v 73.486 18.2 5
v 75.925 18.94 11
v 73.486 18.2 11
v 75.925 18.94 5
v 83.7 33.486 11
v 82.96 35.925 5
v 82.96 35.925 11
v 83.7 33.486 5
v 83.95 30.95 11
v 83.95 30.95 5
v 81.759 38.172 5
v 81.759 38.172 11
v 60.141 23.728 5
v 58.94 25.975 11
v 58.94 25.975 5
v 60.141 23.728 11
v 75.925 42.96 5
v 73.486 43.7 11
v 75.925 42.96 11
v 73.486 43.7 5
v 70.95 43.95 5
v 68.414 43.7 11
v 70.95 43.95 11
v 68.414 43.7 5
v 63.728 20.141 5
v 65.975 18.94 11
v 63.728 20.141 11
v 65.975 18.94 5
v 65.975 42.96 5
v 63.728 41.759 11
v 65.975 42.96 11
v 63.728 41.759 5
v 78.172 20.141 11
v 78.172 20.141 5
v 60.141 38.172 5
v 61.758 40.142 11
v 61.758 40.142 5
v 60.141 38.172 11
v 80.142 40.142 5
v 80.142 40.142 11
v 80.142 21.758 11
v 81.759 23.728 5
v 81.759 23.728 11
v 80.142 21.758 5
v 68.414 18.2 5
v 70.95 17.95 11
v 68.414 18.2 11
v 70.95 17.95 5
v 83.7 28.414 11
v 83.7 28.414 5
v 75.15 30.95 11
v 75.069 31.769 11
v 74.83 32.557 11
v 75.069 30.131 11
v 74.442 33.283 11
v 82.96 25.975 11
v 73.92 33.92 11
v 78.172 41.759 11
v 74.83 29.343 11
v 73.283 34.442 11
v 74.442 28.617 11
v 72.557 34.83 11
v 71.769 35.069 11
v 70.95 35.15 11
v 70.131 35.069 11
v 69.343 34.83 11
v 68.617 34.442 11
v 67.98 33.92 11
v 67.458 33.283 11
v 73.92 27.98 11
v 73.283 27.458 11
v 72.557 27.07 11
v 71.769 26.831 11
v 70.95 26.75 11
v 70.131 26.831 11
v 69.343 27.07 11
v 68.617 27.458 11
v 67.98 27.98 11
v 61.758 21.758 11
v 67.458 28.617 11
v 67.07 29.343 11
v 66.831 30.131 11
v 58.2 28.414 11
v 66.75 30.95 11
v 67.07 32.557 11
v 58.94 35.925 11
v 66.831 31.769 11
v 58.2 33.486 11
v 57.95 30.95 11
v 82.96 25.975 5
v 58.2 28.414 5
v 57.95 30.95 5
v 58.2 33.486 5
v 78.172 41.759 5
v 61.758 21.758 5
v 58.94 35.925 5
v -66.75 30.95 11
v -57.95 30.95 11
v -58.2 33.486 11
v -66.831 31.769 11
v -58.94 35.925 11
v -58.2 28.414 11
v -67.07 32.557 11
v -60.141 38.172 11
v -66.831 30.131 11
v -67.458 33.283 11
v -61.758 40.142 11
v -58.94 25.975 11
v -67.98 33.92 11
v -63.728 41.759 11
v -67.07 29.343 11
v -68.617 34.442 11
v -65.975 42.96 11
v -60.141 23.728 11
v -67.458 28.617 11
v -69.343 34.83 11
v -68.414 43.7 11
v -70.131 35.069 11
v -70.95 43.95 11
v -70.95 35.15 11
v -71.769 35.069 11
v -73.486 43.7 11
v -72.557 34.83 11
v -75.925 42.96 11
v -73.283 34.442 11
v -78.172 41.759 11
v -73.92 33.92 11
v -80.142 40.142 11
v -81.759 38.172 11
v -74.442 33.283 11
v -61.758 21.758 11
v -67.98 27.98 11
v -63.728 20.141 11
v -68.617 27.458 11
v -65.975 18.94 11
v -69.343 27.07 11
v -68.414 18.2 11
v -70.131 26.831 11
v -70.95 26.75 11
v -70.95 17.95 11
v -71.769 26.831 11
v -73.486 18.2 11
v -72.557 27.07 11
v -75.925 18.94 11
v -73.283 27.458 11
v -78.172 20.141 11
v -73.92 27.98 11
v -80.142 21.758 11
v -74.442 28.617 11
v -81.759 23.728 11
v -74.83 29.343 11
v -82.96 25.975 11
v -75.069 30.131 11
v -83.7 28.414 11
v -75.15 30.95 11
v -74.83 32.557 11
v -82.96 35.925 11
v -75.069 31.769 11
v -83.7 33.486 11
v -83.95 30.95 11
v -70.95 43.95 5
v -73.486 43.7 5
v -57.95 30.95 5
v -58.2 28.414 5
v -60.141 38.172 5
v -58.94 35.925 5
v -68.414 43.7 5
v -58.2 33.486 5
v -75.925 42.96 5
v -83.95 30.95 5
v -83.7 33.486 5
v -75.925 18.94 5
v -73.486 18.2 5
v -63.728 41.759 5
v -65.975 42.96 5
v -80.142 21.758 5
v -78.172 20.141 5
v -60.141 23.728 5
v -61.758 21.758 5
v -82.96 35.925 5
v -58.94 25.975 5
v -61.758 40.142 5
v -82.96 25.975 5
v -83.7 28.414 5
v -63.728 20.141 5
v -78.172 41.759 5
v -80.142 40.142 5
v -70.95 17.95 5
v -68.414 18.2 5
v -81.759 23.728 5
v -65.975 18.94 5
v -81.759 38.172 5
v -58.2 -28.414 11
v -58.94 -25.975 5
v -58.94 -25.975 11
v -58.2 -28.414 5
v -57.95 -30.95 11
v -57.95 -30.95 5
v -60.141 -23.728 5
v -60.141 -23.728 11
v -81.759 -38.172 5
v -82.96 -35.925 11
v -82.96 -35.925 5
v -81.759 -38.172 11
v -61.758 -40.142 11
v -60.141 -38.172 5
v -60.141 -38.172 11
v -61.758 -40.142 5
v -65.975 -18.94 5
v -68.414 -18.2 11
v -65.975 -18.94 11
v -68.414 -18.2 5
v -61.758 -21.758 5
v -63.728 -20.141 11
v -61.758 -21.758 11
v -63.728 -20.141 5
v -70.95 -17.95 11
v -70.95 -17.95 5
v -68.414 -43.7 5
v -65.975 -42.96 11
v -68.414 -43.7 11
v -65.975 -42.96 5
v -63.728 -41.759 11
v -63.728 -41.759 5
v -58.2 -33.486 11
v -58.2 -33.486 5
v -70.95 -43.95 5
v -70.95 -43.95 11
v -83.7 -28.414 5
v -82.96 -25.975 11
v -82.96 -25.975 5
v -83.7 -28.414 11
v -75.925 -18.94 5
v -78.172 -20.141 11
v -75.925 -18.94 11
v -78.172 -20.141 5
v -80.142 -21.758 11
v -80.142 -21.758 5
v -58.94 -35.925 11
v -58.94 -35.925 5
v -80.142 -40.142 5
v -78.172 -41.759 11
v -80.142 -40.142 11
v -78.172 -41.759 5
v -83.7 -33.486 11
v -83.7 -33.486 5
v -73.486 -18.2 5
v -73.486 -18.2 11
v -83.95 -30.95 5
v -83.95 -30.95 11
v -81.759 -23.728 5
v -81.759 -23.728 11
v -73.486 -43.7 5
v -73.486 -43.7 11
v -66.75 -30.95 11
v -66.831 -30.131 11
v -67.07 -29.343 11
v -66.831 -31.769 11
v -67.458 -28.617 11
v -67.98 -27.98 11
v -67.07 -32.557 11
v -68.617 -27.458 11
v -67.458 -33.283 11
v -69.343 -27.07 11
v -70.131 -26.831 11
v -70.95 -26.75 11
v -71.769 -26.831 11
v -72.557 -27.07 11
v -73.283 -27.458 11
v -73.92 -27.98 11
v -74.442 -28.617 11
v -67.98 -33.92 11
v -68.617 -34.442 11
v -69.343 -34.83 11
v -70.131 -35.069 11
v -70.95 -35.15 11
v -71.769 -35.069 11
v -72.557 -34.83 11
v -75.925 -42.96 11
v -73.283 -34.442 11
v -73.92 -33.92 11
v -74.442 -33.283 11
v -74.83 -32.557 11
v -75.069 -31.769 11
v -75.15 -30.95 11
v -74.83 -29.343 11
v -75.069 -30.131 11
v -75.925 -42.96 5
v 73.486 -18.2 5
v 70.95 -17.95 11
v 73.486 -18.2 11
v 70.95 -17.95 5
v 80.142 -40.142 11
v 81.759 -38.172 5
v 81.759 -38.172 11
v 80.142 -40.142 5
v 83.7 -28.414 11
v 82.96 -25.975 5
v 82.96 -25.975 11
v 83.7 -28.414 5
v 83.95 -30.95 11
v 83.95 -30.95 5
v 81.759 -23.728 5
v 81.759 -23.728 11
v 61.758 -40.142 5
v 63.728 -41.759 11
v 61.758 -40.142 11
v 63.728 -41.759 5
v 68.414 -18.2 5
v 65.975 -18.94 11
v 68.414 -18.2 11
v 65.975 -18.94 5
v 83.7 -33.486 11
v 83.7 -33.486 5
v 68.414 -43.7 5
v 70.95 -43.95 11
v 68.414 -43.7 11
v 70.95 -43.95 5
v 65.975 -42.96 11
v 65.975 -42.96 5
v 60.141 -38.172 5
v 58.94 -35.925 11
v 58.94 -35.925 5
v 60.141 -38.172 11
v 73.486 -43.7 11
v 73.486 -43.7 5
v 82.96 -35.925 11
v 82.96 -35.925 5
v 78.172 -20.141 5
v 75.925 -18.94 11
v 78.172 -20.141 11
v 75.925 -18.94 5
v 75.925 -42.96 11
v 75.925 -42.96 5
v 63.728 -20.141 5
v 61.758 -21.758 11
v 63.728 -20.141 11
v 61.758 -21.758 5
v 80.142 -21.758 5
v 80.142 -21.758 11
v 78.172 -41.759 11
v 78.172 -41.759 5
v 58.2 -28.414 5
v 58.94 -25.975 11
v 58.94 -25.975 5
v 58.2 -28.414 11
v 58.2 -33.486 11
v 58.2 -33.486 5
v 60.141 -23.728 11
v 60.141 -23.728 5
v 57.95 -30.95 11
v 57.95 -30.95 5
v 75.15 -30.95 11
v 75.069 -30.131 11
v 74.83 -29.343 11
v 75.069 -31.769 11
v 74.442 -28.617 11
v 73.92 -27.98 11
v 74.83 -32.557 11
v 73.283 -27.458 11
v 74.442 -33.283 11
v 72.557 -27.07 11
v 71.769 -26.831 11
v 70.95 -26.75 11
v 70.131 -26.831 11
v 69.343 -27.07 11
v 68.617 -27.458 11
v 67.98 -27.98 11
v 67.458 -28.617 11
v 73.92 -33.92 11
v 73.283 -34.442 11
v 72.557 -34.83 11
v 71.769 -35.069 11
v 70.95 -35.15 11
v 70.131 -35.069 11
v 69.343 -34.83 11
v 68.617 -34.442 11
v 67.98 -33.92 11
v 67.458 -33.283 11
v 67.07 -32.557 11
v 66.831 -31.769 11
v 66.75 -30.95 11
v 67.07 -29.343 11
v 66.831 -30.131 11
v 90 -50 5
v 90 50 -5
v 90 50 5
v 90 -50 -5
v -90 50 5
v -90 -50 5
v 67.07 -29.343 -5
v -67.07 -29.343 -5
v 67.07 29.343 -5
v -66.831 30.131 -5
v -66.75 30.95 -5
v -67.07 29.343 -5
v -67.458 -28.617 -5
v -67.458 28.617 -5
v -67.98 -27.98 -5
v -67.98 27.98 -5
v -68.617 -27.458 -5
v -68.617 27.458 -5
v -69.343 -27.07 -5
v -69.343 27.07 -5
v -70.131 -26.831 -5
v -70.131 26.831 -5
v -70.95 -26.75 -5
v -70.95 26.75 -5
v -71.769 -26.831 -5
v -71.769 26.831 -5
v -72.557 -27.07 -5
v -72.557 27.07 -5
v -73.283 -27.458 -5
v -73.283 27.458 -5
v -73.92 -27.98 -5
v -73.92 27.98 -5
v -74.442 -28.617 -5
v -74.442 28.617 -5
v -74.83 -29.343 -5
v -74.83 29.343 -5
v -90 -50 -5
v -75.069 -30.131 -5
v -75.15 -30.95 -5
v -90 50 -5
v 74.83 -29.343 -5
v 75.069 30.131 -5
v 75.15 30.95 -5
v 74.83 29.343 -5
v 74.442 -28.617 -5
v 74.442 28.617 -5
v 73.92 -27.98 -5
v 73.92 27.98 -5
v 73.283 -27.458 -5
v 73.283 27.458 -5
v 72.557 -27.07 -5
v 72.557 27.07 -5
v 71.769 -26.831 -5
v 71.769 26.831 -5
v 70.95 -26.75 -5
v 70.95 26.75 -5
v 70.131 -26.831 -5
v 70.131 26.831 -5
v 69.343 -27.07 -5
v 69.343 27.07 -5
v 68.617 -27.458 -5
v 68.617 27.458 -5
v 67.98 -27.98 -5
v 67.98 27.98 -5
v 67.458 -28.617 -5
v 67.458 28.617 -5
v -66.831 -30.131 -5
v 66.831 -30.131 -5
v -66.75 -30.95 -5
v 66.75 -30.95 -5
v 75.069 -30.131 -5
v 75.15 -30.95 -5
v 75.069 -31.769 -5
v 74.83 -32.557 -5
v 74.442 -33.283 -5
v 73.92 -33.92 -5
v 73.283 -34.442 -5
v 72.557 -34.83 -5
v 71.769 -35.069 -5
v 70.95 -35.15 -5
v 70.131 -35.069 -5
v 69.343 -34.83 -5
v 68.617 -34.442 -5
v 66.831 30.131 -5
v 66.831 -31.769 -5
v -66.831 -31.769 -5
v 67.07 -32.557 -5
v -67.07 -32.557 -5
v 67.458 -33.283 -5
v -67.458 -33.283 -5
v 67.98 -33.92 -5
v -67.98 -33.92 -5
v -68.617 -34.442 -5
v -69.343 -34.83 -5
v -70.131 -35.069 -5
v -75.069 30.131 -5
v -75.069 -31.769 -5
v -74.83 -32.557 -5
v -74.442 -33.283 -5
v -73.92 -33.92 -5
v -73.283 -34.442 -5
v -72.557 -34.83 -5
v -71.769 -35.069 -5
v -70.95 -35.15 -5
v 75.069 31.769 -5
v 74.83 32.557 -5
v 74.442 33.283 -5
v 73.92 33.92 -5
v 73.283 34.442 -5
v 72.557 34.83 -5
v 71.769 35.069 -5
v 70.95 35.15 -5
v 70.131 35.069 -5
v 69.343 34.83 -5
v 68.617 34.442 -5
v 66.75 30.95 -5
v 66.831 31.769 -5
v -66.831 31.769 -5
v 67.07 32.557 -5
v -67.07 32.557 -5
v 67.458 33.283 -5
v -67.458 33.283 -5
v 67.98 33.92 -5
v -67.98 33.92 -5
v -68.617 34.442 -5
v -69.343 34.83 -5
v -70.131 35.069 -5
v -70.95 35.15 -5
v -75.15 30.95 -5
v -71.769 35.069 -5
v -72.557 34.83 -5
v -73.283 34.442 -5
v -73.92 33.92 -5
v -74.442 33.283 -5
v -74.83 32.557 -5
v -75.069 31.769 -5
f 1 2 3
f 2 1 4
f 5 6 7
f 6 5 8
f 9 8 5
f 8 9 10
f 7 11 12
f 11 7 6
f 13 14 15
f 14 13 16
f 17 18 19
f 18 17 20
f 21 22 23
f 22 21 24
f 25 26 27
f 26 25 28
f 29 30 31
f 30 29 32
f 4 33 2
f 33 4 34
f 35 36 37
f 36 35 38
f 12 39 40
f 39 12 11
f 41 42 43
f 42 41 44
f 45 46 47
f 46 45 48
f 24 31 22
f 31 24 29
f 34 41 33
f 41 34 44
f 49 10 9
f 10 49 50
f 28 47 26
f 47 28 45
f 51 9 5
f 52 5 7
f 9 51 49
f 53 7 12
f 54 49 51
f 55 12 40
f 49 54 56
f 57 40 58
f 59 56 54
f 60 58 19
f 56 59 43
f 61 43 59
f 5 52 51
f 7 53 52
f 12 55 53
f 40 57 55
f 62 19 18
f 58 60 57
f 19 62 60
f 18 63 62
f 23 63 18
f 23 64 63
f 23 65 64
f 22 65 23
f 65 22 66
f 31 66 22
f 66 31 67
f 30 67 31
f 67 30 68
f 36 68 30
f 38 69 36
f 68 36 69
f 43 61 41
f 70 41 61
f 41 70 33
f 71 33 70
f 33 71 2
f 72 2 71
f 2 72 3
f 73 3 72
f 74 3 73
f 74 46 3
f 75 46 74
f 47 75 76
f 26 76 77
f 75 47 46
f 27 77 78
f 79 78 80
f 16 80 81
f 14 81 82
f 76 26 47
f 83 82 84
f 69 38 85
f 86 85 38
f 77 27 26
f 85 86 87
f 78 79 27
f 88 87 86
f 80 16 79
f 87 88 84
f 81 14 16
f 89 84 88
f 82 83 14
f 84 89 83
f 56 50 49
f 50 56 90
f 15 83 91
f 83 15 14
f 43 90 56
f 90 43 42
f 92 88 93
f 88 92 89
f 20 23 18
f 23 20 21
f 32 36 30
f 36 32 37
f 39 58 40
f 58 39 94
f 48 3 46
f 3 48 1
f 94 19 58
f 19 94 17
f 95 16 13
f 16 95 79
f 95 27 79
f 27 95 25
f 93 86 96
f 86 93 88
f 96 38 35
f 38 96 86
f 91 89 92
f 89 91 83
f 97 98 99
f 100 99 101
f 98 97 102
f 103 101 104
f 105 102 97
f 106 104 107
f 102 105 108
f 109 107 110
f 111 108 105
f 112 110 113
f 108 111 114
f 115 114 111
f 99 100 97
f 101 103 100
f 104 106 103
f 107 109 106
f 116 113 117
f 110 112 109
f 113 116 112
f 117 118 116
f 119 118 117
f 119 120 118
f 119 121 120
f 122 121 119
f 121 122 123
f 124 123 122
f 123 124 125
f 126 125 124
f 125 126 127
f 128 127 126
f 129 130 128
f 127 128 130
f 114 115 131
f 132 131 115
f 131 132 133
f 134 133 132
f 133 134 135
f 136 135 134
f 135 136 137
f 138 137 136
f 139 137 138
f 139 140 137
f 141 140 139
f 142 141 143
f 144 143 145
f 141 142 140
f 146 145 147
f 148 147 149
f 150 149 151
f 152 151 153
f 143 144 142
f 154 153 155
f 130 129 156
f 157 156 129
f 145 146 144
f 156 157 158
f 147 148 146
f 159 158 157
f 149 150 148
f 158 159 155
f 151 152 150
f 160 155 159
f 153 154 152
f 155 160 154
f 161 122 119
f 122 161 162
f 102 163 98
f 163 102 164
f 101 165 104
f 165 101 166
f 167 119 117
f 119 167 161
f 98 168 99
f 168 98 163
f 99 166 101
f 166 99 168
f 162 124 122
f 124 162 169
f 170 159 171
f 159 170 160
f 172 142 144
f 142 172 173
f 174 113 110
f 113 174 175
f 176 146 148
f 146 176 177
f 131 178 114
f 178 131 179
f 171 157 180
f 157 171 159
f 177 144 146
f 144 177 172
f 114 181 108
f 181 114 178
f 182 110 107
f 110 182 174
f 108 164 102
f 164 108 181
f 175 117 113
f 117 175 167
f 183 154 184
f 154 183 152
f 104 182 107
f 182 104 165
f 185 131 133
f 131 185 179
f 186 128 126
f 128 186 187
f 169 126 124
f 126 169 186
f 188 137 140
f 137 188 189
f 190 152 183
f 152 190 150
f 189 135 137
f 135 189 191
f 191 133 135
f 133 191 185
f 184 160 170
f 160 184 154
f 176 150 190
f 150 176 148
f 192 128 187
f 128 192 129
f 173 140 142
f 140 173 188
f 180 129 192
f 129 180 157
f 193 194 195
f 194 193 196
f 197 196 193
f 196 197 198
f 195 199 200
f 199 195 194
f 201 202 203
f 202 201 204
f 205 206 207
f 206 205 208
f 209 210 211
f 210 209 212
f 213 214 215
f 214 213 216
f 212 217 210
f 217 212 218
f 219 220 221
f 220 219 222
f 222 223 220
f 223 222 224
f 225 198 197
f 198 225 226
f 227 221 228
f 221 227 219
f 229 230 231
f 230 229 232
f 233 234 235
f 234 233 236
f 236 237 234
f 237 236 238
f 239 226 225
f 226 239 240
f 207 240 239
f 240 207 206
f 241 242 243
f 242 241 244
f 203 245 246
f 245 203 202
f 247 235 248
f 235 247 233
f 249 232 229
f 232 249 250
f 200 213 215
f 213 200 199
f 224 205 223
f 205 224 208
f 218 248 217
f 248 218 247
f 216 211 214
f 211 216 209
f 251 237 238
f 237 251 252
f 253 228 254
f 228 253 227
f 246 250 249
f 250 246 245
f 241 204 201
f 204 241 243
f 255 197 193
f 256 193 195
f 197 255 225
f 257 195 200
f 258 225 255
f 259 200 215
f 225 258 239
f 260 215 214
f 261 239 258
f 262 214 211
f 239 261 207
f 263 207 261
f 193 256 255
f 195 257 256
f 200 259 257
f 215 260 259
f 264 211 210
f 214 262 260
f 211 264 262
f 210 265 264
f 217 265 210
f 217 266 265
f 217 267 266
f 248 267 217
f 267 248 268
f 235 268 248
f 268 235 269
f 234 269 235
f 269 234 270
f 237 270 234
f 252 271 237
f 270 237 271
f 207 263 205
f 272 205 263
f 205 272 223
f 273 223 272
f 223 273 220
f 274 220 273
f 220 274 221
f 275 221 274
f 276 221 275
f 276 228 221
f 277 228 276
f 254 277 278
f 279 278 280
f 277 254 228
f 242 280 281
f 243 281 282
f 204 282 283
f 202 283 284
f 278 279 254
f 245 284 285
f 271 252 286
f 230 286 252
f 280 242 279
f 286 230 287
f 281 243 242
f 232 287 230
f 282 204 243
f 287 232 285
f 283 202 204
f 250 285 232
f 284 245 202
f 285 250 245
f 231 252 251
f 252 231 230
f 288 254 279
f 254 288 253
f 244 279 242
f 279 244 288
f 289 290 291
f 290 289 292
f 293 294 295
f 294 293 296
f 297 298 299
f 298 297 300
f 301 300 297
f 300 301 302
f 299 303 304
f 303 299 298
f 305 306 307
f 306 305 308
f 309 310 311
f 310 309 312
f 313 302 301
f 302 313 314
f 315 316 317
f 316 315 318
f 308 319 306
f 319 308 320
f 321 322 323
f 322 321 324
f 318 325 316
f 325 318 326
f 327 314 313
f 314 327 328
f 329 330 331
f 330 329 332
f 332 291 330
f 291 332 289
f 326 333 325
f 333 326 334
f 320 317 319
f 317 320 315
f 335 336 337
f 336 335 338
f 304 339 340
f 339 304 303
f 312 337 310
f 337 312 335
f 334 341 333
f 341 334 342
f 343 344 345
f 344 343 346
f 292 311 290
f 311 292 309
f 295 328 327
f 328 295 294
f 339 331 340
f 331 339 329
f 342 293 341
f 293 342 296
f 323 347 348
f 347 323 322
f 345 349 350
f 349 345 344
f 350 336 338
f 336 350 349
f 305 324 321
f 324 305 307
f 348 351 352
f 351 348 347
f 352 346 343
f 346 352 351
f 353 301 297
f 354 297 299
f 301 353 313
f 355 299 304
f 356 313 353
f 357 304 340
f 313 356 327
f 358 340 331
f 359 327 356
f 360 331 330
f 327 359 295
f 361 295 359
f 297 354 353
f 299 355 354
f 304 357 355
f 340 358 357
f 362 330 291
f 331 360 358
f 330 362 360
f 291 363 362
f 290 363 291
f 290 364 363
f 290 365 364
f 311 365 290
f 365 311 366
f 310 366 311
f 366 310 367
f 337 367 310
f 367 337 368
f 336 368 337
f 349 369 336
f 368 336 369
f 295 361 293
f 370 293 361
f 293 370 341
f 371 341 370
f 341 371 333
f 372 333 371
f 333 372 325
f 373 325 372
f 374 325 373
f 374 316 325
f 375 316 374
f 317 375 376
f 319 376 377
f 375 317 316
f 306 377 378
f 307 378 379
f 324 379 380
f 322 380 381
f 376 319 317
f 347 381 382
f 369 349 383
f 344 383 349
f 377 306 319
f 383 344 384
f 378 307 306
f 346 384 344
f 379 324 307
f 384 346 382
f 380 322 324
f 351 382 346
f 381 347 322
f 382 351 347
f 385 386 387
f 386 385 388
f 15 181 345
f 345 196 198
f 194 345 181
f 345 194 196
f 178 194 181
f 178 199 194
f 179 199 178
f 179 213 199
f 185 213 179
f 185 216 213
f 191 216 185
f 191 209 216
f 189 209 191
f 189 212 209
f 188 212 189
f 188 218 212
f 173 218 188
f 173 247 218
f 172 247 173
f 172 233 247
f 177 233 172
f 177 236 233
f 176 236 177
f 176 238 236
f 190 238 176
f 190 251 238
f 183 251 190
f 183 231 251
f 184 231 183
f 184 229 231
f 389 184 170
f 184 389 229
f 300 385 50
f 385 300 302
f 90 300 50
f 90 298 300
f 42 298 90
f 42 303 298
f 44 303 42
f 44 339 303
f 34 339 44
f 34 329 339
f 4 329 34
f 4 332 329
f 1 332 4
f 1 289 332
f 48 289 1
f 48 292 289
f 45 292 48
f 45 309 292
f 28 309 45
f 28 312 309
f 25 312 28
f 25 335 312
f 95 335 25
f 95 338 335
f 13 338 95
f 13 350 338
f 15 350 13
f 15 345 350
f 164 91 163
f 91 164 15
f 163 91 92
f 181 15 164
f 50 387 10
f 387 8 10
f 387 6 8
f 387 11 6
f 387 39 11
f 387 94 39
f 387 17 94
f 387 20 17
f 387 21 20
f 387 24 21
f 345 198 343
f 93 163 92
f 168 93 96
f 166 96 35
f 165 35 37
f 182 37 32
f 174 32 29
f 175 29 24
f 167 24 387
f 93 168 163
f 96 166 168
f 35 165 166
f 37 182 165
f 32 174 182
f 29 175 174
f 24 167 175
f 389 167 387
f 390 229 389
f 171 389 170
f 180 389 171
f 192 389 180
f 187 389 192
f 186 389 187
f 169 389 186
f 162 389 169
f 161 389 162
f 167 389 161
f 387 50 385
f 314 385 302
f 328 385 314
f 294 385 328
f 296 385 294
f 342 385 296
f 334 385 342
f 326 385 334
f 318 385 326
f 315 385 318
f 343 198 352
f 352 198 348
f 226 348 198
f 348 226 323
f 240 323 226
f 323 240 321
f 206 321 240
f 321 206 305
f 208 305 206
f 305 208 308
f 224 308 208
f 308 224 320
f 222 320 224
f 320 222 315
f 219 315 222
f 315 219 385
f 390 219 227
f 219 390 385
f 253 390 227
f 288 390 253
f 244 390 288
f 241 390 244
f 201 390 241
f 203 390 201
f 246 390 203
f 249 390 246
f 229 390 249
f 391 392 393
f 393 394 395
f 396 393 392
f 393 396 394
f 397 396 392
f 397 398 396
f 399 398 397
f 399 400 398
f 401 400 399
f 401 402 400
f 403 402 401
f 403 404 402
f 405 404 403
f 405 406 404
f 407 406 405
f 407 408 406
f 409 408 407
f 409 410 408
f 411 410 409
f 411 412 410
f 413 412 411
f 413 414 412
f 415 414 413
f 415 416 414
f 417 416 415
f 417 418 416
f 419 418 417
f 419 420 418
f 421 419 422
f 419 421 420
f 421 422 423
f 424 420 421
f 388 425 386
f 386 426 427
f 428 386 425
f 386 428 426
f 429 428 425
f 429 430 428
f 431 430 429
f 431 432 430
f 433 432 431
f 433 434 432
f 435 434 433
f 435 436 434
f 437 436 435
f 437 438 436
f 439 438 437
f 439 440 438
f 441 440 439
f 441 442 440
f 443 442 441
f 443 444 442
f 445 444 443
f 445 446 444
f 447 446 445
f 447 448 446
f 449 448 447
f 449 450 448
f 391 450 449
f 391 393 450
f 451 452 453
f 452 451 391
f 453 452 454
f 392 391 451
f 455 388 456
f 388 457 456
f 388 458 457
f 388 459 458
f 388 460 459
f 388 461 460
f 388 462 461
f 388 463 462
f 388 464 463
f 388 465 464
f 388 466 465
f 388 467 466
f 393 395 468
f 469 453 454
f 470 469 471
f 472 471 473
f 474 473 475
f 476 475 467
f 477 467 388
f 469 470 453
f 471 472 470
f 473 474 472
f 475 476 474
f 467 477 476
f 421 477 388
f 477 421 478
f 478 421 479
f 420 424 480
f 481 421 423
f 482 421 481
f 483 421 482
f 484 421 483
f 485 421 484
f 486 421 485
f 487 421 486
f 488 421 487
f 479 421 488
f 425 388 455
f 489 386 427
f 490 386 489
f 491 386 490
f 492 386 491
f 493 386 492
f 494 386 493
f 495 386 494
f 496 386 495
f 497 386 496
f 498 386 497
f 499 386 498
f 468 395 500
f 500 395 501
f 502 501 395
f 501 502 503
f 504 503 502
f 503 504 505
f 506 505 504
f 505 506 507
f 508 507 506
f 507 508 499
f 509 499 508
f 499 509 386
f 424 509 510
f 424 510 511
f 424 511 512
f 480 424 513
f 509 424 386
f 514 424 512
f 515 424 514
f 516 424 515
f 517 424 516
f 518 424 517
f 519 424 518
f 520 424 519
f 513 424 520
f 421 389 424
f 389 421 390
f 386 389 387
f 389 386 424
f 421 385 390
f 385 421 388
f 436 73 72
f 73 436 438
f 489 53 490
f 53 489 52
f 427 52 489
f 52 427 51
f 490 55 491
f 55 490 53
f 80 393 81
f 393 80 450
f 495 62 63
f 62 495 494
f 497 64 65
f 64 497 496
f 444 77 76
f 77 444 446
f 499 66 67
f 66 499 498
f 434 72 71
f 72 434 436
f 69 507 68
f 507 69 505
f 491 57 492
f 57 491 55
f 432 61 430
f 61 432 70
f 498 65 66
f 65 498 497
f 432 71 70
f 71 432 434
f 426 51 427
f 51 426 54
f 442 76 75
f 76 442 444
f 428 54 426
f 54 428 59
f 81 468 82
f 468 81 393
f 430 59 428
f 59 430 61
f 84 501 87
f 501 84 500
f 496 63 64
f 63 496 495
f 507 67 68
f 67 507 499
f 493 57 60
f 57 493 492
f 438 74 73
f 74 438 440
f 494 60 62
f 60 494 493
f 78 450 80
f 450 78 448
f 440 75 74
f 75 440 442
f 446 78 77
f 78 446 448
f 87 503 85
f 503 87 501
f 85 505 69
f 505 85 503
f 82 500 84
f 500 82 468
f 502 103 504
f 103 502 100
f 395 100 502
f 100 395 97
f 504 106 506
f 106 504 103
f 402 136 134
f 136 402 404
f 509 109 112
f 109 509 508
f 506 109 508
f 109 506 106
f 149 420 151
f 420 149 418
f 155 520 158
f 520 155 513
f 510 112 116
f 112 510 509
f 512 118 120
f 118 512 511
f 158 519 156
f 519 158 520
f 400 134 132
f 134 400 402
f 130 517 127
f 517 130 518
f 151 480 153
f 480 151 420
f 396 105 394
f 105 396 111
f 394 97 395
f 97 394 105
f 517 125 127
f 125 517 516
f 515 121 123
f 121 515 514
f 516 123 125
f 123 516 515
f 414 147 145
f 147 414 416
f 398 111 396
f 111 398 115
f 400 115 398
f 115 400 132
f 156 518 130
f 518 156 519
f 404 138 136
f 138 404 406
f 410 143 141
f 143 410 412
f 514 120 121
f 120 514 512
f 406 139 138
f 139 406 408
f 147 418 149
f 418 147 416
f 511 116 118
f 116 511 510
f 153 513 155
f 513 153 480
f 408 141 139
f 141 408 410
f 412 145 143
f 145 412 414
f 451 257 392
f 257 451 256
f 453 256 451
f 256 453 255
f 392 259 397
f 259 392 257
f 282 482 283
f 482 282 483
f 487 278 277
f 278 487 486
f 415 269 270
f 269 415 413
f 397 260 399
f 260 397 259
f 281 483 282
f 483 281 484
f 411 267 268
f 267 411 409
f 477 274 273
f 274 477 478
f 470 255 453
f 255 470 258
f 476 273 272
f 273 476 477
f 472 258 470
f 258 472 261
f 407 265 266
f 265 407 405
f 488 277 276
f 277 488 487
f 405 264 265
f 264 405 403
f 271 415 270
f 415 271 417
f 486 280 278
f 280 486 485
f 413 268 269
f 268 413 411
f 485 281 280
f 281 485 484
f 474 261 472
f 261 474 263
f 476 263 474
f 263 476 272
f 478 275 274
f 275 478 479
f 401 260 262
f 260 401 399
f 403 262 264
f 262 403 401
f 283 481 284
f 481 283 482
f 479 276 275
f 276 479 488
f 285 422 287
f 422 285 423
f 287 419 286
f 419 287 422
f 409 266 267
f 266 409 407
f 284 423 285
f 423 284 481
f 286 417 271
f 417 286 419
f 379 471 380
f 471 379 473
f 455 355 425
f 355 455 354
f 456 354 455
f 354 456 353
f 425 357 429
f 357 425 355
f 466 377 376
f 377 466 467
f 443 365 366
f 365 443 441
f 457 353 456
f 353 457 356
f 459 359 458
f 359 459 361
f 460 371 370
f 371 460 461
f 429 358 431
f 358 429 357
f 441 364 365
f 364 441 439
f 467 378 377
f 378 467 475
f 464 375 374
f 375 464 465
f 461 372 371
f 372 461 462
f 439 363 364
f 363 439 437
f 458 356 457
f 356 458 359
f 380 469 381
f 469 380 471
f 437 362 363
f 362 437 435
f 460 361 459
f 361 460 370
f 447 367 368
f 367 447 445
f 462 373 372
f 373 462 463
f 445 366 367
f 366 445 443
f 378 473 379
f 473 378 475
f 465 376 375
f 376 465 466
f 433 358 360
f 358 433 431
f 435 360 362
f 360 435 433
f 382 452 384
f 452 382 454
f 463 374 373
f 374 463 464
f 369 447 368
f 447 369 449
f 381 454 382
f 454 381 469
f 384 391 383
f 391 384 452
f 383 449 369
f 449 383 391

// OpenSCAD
$fn = 32;

// ----------------------------------------------------------------------
// Anchor pads 180 x 100 x 16
// four corner bosses with anchor holes
// ----------------------------------------------------------------------

// --- parameters (mm) ---
plate = [180, 100, 10];  // base plate size (x, y, z)
pads = 4;                // boss count, one per corner
edge = 19.05;            // boss centre offset from the plate edge
boss_d = 26;             // boss diameter
boss_h = 6;              // boss height above the base plate
hole_d = 8.4;            // hole diameter

// --- derived feature positions (mm) ---
height = plate[2] + boss_h;      // = 16   overall height of the part
corner_x = plate[0] / 2 - edge;  // = 70.95   boss centre X
corner_y = plate[1] / 2 - edge;  // = 30.95   boss centre Y
feature_centers = [
  [corner_x, corner_y],
  [-corner_x, corner_y],
  [-corner_x, -corner_y],
  [corner_x, -corner_y]
];   // boss centres, anchor holes are drilled there

// base plate, four bosses standing on it, anchor holes all the way through
difference() {
  union() {
    cube(plate, center = true);
    for (centre = feature_centers)
      translate([centre[0], centre[1], plate[2] / 2 - 1])
        cylinder(d = boss_d, h = boss_h + 1);
  }
  for (centre = feature_centers)
    translate([centre[0], centre[1], -height])
      cylinder(d = hole_d, h = 2 * height + 2);  // through boss and plate
}
